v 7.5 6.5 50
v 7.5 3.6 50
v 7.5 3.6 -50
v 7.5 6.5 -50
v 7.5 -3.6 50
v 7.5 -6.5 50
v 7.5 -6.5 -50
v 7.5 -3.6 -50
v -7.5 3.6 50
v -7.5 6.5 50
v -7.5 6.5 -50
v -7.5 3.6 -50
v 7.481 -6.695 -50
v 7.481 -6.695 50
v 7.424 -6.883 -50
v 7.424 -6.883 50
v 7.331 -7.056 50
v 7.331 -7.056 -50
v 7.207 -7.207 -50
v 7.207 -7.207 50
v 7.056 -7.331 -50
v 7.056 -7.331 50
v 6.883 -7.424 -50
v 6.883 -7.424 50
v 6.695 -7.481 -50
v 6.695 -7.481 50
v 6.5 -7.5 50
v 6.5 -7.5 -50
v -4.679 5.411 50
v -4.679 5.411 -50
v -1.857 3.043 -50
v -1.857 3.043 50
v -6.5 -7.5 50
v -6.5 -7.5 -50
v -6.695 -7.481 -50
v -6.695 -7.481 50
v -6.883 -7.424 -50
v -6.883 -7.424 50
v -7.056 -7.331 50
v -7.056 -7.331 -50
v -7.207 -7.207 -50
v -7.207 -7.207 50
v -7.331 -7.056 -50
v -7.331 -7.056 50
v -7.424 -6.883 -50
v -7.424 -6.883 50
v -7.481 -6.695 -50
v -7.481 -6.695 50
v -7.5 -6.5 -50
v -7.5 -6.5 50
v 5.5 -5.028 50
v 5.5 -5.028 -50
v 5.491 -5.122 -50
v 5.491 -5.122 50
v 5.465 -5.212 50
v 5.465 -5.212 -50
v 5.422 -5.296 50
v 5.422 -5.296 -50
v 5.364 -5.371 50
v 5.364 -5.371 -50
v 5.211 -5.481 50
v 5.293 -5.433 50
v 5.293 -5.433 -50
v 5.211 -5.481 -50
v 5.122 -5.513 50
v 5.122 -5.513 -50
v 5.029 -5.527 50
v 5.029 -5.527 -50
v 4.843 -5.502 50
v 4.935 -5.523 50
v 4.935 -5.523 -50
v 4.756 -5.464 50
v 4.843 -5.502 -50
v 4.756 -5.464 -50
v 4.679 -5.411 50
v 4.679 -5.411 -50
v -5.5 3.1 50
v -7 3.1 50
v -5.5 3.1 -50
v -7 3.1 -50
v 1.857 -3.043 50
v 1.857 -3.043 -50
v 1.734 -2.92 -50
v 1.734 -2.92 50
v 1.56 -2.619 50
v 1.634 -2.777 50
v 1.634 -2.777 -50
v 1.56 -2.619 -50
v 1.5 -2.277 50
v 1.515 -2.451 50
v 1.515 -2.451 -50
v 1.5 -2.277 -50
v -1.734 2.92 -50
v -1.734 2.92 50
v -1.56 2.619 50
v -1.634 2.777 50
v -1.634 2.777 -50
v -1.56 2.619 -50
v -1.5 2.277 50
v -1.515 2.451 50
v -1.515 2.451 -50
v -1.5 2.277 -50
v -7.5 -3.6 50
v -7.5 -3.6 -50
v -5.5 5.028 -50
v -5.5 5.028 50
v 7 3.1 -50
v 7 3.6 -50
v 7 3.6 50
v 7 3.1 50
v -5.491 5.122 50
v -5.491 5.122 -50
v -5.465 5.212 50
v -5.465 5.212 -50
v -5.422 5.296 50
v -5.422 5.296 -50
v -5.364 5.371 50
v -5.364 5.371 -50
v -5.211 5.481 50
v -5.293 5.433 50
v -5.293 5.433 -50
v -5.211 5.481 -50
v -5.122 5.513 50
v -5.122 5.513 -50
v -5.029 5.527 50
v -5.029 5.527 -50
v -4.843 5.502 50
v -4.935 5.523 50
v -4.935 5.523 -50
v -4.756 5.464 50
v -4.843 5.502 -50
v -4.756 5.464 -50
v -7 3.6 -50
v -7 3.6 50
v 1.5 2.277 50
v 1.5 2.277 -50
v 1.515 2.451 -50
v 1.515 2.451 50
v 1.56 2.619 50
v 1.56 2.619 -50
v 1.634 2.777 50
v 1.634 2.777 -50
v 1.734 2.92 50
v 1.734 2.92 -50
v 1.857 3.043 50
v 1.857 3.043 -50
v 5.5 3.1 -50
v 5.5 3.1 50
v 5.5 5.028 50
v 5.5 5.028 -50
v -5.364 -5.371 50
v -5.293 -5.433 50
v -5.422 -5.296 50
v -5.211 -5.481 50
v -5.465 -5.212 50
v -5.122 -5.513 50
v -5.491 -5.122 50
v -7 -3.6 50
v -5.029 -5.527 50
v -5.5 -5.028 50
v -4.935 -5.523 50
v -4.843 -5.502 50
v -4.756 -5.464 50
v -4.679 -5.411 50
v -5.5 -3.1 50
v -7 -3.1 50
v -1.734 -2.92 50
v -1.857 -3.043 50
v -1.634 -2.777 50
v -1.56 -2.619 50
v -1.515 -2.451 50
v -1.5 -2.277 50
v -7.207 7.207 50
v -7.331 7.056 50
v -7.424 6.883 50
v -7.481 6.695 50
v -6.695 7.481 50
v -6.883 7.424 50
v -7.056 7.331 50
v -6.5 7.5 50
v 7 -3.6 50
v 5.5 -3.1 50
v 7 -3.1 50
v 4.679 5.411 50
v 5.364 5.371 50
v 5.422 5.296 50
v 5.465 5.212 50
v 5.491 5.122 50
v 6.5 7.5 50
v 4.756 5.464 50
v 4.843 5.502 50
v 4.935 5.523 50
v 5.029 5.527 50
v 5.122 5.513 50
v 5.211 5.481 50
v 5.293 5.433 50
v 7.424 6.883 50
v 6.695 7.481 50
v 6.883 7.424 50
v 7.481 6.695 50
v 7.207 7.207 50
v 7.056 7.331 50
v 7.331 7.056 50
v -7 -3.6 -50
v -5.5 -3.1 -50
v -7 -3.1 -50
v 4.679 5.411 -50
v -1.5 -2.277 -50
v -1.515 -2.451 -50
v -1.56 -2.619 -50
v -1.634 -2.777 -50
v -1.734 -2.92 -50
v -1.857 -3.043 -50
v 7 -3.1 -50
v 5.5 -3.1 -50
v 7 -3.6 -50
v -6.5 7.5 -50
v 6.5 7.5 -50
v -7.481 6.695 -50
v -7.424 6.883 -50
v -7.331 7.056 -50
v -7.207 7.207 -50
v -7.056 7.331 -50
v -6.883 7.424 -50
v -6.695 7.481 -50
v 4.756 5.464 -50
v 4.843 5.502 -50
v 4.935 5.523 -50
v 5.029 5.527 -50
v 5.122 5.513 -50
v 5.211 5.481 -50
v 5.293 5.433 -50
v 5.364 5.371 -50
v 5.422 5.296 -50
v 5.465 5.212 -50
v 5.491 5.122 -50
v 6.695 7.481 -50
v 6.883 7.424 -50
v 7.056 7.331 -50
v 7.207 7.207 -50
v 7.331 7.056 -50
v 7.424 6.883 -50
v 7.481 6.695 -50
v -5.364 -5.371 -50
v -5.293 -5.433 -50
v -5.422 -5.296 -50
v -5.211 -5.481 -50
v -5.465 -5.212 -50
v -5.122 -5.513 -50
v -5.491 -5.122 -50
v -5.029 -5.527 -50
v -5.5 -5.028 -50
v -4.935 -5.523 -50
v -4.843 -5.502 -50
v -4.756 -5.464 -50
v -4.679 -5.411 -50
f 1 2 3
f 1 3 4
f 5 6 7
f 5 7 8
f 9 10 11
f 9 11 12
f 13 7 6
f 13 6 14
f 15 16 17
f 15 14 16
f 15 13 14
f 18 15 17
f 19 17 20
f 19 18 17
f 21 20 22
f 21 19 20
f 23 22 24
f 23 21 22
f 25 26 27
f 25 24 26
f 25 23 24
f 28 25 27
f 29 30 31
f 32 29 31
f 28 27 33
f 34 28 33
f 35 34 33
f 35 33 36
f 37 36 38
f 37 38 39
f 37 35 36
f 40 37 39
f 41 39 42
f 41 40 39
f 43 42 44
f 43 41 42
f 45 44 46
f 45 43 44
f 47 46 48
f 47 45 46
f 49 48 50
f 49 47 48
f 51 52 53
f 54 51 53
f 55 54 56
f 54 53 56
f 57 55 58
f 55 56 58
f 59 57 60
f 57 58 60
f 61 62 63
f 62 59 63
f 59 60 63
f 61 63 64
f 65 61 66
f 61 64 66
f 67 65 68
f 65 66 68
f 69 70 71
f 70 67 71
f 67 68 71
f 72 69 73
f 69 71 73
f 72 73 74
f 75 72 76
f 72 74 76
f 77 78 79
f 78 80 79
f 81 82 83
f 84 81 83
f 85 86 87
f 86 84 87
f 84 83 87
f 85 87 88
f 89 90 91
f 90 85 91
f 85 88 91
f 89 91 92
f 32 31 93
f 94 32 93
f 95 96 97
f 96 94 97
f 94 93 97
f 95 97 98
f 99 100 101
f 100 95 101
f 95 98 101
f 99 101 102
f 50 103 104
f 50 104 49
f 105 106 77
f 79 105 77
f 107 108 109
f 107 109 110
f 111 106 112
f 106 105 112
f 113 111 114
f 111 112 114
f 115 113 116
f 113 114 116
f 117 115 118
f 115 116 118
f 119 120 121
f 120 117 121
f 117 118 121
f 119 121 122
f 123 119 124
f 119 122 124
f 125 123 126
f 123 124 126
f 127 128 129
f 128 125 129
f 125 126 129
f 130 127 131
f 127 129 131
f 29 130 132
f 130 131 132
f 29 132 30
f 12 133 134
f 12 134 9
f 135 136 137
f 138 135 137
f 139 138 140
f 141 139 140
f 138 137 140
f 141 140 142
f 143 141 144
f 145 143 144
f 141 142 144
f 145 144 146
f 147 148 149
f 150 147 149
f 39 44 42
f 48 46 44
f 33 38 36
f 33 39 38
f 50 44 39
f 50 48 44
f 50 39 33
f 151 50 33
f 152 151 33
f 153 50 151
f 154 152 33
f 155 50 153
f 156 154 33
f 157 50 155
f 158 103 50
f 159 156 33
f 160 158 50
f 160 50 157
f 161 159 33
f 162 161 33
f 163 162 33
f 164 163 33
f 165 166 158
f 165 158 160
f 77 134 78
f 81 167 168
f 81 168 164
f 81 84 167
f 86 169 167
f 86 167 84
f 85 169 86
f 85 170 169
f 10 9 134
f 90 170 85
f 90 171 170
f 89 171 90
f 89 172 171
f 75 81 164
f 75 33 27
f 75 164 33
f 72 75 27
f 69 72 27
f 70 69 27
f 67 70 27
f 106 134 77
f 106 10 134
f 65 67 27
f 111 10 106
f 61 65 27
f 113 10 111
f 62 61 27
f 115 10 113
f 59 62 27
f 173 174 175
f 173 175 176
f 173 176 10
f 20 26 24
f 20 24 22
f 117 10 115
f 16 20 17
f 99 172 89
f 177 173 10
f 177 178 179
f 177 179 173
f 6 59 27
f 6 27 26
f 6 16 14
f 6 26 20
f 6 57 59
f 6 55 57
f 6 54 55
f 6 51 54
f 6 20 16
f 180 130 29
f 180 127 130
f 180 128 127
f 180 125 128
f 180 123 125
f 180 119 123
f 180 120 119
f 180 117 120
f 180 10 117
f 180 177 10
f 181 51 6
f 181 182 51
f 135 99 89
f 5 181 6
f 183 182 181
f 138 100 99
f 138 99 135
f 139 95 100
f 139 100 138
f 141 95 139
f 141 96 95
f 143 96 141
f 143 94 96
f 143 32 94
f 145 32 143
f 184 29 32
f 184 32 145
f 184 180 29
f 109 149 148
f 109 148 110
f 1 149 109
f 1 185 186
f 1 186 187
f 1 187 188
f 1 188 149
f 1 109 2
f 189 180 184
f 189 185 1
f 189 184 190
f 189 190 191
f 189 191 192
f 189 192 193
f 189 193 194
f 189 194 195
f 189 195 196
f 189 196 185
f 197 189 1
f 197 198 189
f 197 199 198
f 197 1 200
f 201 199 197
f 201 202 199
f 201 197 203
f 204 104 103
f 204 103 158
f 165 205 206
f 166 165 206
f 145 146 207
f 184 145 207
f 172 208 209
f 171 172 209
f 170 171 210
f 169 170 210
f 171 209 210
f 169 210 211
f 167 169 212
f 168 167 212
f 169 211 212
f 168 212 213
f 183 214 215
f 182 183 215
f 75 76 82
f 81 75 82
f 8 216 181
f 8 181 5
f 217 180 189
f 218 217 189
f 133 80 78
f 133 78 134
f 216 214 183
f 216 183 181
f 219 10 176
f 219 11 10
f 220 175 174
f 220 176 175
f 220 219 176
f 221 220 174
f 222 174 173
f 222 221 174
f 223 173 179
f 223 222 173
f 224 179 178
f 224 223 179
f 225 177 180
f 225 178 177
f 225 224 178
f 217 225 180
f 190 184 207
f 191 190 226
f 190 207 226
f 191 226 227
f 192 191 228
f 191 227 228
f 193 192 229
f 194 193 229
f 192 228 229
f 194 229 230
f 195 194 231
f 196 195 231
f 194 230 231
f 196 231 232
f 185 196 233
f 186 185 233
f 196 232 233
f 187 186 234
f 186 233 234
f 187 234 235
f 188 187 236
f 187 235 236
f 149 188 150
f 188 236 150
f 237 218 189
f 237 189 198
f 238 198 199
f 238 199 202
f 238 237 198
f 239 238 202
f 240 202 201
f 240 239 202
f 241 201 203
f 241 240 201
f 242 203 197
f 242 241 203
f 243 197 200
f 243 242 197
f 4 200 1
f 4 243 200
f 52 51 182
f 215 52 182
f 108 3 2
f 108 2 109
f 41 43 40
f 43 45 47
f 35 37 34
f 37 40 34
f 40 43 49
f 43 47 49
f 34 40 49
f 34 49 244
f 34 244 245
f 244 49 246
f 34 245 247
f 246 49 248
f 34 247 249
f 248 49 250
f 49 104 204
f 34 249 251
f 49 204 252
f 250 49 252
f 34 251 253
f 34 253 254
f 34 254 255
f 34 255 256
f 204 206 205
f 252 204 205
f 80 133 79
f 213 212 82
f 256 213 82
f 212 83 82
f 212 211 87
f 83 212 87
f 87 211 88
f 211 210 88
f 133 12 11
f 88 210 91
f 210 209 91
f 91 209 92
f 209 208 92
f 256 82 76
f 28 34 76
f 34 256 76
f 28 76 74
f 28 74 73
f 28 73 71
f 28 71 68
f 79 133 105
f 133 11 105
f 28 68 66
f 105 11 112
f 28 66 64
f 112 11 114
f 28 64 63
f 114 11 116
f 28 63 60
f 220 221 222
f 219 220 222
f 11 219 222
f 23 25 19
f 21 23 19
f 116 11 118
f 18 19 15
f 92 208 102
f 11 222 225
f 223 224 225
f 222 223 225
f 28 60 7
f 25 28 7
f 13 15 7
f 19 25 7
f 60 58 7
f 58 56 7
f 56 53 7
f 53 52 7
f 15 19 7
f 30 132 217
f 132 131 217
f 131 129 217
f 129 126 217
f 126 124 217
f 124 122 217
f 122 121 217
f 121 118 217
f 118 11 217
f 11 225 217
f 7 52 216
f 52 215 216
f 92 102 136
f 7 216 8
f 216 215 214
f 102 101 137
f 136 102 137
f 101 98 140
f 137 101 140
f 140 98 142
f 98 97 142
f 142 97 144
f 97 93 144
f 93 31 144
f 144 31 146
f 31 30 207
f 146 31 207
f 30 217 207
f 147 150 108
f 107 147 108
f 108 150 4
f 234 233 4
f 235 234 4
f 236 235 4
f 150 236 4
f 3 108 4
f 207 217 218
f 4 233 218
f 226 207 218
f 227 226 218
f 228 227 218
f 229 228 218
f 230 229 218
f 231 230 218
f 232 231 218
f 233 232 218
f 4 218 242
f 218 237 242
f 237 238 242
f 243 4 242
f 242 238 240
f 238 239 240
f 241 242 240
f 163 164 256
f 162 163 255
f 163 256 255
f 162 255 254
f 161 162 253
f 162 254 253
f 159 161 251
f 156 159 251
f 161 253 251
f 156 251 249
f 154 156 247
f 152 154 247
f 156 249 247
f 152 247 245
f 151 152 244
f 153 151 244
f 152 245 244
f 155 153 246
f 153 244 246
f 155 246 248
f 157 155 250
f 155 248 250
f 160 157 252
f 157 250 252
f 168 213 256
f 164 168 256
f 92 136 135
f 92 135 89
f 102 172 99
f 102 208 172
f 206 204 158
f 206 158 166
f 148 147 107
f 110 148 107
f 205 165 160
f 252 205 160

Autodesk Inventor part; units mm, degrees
ref_plane "YZ Plane" through (0, 0, 0) normal (1, 0, 0) x (0, 1, 0)
ref_plane "XZ Plane" through (0, 0, 0) normal (0, 1, 0) x (-1, 0, 0)
ref_plane "XY Plane" through (0, 0, 0) normal (0, 0, 1) x (1, 0, 0)
sketch "Esboço1" plane through (0, 0, 0) normal (0, 0, 1) x (1, 0, 0)
  line L0 (-7.5, 7.5) -> (7.5, 7.5) construction
  line L1 (-7.5, 7.5) -> (-7.5, 3.1) construction
  line L2 (-7.5, 3.1) -> (-5.5, 3.1) construction
  line L3 (-5.5, 6.1) -> (-5.5, 3.1) construction
  line L4 (-5.5, 6.1) -> (-1.5, 2.7436) construction
  line L5 (-1.5, 2.7436) -> (-1.5, 0) construction
  line L6 (-1.5, 0) -> (0, 0)
  line L7 (0, 0) -> (0, 7.5)
  arc A0 (-6.5, 7.5) -> (-7.5, 6.5) centre (-6.5, 6.5) ccw
  arc A1 (-4.6786, 5.4108) -> (-5.5, 5.0277) centre (-5, 5.0277) ccw
  arc A2 (-1.5, 2.2773) -> (-1.8572, 3.0433) centre (-2.5, 2.2773) ccw
  line L8 (-7.5, 3.1) -> (-7, 3.1) construction
  line L9 (-7, 3.1) -> (-7, 3.6)
  line L10 (-7, 3.6) -> (-7.5, 3.6)
  line L11 (-7.5, 3.6) -> (-7.5, 3.1) construction
  line L12 (-7.5, 6.5) -> (-7.5, 3.6)
  line L13 (-7, 3.1) -> (-5.5, 3.1)
  line L14 (-5.5, 5.0277) -> (-5.5, 3.1)
  line L15 (-4.6786, 5.4108) -> (-1.8572, 3.0433)
  line L16 (-1.5, 0) -> (-1.5, 2.2773)
  line L17 (-6.5, 7.5) -> (0, 7.5)
  point P0 (-7.5, 5.3)
  dimension "d0" = 15
  dimension "d2" = 7.5
  dimension "d3" = 3.1
  dimension "d4" = 2
  dimension "d5" = 3
  dimension "d6" = 6
  dimension "d7" = 50
  dimension "d10" = 1
  dimension "d11" = 0.5
  dimension "d12" = 1
  dimension "d13" = 0.5
extrude "Extrusão1" add sketch "Esboço1" along normal mid plane 100
mirror "Espelhar1" about plane through (0, 0, 0) normal (1, 0, 0) of "Extrusão1"
mirror "Espelhar2" about plane through (0, 0, 0) normal (0, 1, 0) of "Extrusão1", "Espelhar1"
properties part number "perfil_15x15_001" material "Alumínio 6061"
